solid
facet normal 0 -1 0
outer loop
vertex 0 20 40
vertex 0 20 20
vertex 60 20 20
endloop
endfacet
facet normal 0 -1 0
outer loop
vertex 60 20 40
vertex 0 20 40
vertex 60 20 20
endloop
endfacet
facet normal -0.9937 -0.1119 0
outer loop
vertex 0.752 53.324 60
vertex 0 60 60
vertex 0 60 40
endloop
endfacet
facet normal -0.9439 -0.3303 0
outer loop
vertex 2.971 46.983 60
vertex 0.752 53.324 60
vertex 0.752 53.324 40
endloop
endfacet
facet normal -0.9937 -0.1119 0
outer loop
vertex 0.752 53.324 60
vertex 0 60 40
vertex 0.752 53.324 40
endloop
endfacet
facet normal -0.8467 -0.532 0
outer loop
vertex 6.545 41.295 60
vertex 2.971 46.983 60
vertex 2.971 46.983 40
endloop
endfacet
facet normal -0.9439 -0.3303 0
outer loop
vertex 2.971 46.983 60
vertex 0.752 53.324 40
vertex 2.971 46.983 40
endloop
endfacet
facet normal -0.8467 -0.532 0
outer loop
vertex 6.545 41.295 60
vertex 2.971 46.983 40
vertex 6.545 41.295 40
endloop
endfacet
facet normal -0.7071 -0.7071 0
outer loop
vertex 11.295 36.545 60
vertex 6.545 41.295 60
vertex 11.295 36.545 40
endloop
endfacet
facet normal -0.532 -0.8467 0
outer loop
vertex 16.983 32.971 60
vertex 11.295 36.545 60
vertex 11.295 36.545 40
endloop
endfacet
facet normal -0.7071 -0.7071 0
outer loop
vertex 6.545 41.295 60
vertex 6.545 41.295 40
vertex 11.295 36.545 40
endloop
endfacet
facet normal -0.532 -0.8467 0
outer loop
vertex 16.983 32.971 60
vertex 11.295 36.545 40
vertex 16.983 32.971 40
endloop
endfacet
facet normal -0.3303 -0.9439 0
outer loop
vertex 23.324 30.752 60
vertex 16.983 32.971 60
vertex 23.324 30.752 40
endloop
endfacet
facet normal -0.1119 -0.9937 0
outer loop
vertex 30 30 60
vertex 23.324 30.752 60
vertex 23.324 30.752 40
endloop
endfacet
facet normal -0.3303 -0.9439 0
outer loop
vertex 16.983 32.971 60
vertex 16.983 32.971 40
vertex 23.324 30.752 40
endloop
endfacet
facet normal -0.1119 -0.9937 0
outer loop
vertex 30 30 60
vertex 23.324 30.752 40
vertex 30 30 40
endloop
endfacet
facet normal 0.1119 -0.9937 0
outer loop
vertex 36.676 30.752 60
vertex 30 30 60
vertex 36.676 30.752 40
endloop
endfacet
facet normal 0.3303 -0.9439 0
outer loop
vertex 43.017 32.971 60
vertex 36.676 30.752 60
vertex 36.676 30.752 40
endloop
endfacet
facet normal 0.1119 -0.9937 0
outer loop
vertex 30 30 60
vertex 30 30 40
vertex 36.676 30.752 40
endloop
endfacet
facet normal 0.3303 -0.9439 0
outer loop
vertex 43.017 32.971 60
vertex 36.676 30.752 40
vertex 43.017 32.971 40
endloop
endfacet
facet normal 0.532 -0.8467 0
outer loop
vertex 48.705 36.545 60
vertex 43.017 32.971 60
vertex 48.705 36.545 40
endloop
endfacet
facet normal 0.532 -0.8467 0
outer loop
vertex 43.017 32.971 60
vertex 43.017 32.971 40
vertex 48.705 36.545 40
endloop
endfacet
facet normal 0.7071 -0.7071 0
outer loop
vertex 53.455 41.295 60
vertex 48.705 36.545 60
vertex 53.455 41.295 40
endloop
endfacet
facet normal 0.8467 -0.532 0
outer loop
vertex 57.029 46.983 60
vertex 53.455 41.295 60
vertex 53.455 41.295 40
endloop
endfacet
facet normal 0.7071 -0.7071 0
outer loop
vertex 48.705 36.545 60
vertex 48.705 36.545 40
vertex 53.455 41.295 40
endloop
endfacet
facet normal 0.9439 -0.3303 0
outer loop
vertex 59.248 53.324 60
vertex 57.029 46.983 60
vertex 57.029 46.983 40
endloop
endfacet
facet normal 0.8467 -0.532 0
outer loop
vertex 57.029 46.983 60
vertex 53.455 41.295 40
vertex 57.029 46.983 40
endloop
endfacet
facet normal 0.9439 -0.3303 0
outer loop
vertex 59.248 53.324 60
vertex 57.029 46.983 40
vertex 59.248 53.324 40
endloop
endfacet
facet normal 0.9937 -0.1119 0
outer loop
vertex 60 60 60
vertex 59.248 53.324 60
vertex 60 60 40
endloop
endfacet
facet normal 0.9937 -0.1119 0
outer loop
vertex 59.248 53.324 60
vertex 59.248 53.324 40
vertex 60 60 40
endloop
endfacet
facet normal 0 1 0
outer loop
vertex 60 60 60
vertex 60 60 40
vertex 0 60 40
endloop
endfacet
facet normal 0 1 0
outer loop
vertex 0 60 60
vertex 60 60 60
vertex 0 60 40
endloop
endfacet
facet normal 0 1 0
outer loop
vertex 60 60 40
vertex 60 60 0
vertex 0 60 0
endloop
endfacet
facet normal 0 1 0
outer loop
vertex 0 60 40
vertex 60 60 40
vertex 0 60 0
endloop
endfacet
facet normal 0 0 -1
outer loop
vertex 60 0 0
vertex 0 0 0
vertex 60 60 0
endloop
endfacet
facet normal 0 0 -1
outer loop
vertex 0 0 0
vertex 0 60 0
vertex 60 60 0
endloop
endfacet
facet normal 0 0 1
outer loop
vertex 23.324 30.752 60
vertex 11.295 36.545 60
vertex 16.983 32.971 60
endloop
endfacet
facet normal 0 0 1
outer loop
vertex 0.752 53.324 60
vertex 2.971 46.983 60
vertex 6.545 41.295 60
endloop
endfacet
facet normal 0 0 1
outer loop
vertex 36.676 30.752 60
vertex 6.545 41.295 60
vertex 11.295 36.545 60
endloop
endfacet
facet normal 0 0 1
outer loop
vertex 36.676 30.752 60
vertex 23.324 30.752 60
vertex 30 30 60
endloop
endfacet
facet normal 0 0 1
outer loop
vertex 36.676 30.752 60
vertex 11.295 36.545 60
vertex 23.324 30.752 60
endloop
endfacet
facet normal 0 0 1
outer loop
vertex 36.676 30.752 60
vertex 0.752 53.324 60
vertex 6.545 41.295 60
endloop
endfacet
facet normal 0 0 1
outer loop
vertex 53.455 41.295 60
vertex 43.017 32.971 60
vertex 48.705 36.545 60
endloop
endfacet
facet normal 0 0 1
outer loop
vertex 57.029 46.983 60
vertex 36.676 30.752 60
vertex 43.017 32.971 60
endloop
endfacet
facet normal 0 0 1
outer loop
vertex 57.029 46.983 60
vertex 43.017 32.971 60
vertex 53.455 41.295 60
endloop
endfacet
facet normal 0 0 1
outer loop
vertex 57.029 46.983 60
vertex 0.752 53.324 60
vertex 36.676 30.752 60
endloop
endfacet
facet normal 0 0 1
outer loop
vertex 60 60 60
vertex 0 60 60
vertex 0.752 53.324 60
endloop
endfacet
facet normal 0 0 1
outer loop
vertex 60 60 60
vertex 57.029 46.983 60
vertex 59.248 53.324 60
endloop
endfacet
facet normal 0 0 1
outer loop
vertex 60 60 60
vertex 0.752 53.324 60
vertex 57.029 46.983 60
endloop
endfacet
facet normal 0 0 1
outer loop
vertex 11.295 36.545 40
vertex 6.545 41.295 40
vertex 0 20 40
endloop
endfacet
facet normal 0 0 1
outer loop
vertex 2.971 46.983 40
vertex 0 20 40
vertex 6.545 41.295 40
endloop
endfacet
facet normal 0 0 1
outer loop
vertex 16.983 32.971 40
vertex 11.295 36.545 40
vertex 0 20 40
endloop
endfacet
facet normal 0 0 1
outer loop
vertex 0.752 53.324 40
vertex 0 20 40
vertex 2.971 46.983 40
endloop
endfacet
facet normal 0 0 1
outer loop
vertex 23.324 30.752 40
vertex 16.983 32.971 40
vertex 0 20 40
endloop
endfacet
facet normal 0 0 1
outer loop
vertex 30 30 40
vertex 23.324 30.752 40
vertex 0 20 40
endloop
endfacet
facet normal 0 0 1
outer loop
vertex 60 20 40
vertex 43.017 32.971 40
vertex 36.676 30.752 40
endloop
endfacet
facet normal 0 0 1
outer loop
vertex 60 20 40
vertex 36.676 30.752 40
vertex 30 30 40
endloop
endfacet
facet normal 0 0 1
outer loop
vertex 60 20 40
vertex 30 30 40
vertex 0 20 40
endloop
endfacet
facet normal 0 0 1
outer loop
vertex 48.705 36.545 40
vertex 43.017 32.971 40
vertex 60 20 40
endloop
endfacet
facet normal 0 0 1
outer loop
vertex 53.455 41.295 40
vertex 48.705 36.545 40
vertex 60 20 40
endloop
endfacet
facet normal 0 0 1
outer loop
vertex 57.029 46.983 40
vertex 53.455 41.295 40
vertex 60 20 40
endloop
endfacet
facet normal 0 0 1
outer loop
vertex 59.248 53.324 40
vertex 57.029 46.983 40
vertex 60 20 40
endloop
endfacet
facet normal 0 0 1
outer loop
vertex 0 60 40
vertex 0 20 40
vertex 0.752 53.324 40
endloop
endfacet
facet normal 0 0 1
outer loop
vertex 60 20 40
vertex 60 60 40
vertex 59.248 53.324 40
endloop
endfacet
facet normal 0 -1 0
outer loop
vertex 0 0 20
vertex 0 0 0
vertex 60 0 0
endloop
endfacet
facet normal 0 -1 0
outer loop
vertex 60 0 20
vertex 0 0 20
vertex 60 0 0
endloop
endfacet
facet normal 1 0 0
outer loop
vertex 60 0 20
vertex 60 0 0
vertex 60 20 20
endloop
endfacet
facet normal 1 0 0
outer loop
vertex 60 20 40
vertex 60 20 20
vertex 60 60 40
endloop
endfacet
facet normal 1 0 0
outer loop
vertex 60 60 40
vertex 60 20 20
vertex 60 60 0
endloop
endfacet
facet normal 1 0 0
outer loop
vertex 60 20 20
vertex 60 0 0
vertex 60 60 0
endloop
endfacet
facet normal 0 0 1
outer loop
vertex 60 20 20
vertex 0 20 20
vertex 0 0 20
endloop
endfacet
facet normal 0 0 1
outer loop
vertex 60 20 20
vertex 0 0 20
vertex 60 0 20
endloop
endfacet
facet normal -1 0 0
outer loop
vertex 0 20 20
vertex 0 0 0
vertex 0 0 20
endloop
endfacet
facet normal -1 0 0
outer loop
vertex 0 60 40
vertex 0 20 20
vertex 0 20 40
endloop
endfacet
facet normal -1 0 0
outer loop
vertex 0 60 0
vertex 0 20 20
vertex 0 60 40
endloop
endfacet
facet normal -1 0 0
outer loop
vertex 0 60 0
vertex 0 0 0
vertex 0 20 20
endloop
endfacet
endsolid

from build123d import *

# Parameters (mm, degrees)
F1_DEPTH = 60
F2_DEPTH = 40
F0_W     = 60
F0_H     = 20
F3_DEPTH = 20


with BuildPart() as f1:
    # F0 (on Top) → F1 (new body)
    with BuildSketch(Plane.XY):
        with BuildLine():
            Line((60, 60), (0, 60))
            ThreePointArc((0, 60), (30, 30), (60, 60))
        make_face()
    extrude(amount=F1_DEPTH)

    # F0 (on Top) → F2 (join)
    with BuildSketch(Plane.XY):
        with BuildLine():
            Line((0, 60), (0, 20))
            Line((0, 20), (60, 20))
            Line((60, 20), (60, 60))
            ThreePointArc((60, 60), (30, 30), (0, 60))
        make_face()
    extrude(amount=F2_DEPTH)

    # F0 (on Top) → F3 (join)
    with BuildSketch(Plane.XY):
        with Locations((30, 10)):
            Rectangle(F0_W, F0_H)
    extrude(amount=F3_DEPTH)


solid = f1.part
